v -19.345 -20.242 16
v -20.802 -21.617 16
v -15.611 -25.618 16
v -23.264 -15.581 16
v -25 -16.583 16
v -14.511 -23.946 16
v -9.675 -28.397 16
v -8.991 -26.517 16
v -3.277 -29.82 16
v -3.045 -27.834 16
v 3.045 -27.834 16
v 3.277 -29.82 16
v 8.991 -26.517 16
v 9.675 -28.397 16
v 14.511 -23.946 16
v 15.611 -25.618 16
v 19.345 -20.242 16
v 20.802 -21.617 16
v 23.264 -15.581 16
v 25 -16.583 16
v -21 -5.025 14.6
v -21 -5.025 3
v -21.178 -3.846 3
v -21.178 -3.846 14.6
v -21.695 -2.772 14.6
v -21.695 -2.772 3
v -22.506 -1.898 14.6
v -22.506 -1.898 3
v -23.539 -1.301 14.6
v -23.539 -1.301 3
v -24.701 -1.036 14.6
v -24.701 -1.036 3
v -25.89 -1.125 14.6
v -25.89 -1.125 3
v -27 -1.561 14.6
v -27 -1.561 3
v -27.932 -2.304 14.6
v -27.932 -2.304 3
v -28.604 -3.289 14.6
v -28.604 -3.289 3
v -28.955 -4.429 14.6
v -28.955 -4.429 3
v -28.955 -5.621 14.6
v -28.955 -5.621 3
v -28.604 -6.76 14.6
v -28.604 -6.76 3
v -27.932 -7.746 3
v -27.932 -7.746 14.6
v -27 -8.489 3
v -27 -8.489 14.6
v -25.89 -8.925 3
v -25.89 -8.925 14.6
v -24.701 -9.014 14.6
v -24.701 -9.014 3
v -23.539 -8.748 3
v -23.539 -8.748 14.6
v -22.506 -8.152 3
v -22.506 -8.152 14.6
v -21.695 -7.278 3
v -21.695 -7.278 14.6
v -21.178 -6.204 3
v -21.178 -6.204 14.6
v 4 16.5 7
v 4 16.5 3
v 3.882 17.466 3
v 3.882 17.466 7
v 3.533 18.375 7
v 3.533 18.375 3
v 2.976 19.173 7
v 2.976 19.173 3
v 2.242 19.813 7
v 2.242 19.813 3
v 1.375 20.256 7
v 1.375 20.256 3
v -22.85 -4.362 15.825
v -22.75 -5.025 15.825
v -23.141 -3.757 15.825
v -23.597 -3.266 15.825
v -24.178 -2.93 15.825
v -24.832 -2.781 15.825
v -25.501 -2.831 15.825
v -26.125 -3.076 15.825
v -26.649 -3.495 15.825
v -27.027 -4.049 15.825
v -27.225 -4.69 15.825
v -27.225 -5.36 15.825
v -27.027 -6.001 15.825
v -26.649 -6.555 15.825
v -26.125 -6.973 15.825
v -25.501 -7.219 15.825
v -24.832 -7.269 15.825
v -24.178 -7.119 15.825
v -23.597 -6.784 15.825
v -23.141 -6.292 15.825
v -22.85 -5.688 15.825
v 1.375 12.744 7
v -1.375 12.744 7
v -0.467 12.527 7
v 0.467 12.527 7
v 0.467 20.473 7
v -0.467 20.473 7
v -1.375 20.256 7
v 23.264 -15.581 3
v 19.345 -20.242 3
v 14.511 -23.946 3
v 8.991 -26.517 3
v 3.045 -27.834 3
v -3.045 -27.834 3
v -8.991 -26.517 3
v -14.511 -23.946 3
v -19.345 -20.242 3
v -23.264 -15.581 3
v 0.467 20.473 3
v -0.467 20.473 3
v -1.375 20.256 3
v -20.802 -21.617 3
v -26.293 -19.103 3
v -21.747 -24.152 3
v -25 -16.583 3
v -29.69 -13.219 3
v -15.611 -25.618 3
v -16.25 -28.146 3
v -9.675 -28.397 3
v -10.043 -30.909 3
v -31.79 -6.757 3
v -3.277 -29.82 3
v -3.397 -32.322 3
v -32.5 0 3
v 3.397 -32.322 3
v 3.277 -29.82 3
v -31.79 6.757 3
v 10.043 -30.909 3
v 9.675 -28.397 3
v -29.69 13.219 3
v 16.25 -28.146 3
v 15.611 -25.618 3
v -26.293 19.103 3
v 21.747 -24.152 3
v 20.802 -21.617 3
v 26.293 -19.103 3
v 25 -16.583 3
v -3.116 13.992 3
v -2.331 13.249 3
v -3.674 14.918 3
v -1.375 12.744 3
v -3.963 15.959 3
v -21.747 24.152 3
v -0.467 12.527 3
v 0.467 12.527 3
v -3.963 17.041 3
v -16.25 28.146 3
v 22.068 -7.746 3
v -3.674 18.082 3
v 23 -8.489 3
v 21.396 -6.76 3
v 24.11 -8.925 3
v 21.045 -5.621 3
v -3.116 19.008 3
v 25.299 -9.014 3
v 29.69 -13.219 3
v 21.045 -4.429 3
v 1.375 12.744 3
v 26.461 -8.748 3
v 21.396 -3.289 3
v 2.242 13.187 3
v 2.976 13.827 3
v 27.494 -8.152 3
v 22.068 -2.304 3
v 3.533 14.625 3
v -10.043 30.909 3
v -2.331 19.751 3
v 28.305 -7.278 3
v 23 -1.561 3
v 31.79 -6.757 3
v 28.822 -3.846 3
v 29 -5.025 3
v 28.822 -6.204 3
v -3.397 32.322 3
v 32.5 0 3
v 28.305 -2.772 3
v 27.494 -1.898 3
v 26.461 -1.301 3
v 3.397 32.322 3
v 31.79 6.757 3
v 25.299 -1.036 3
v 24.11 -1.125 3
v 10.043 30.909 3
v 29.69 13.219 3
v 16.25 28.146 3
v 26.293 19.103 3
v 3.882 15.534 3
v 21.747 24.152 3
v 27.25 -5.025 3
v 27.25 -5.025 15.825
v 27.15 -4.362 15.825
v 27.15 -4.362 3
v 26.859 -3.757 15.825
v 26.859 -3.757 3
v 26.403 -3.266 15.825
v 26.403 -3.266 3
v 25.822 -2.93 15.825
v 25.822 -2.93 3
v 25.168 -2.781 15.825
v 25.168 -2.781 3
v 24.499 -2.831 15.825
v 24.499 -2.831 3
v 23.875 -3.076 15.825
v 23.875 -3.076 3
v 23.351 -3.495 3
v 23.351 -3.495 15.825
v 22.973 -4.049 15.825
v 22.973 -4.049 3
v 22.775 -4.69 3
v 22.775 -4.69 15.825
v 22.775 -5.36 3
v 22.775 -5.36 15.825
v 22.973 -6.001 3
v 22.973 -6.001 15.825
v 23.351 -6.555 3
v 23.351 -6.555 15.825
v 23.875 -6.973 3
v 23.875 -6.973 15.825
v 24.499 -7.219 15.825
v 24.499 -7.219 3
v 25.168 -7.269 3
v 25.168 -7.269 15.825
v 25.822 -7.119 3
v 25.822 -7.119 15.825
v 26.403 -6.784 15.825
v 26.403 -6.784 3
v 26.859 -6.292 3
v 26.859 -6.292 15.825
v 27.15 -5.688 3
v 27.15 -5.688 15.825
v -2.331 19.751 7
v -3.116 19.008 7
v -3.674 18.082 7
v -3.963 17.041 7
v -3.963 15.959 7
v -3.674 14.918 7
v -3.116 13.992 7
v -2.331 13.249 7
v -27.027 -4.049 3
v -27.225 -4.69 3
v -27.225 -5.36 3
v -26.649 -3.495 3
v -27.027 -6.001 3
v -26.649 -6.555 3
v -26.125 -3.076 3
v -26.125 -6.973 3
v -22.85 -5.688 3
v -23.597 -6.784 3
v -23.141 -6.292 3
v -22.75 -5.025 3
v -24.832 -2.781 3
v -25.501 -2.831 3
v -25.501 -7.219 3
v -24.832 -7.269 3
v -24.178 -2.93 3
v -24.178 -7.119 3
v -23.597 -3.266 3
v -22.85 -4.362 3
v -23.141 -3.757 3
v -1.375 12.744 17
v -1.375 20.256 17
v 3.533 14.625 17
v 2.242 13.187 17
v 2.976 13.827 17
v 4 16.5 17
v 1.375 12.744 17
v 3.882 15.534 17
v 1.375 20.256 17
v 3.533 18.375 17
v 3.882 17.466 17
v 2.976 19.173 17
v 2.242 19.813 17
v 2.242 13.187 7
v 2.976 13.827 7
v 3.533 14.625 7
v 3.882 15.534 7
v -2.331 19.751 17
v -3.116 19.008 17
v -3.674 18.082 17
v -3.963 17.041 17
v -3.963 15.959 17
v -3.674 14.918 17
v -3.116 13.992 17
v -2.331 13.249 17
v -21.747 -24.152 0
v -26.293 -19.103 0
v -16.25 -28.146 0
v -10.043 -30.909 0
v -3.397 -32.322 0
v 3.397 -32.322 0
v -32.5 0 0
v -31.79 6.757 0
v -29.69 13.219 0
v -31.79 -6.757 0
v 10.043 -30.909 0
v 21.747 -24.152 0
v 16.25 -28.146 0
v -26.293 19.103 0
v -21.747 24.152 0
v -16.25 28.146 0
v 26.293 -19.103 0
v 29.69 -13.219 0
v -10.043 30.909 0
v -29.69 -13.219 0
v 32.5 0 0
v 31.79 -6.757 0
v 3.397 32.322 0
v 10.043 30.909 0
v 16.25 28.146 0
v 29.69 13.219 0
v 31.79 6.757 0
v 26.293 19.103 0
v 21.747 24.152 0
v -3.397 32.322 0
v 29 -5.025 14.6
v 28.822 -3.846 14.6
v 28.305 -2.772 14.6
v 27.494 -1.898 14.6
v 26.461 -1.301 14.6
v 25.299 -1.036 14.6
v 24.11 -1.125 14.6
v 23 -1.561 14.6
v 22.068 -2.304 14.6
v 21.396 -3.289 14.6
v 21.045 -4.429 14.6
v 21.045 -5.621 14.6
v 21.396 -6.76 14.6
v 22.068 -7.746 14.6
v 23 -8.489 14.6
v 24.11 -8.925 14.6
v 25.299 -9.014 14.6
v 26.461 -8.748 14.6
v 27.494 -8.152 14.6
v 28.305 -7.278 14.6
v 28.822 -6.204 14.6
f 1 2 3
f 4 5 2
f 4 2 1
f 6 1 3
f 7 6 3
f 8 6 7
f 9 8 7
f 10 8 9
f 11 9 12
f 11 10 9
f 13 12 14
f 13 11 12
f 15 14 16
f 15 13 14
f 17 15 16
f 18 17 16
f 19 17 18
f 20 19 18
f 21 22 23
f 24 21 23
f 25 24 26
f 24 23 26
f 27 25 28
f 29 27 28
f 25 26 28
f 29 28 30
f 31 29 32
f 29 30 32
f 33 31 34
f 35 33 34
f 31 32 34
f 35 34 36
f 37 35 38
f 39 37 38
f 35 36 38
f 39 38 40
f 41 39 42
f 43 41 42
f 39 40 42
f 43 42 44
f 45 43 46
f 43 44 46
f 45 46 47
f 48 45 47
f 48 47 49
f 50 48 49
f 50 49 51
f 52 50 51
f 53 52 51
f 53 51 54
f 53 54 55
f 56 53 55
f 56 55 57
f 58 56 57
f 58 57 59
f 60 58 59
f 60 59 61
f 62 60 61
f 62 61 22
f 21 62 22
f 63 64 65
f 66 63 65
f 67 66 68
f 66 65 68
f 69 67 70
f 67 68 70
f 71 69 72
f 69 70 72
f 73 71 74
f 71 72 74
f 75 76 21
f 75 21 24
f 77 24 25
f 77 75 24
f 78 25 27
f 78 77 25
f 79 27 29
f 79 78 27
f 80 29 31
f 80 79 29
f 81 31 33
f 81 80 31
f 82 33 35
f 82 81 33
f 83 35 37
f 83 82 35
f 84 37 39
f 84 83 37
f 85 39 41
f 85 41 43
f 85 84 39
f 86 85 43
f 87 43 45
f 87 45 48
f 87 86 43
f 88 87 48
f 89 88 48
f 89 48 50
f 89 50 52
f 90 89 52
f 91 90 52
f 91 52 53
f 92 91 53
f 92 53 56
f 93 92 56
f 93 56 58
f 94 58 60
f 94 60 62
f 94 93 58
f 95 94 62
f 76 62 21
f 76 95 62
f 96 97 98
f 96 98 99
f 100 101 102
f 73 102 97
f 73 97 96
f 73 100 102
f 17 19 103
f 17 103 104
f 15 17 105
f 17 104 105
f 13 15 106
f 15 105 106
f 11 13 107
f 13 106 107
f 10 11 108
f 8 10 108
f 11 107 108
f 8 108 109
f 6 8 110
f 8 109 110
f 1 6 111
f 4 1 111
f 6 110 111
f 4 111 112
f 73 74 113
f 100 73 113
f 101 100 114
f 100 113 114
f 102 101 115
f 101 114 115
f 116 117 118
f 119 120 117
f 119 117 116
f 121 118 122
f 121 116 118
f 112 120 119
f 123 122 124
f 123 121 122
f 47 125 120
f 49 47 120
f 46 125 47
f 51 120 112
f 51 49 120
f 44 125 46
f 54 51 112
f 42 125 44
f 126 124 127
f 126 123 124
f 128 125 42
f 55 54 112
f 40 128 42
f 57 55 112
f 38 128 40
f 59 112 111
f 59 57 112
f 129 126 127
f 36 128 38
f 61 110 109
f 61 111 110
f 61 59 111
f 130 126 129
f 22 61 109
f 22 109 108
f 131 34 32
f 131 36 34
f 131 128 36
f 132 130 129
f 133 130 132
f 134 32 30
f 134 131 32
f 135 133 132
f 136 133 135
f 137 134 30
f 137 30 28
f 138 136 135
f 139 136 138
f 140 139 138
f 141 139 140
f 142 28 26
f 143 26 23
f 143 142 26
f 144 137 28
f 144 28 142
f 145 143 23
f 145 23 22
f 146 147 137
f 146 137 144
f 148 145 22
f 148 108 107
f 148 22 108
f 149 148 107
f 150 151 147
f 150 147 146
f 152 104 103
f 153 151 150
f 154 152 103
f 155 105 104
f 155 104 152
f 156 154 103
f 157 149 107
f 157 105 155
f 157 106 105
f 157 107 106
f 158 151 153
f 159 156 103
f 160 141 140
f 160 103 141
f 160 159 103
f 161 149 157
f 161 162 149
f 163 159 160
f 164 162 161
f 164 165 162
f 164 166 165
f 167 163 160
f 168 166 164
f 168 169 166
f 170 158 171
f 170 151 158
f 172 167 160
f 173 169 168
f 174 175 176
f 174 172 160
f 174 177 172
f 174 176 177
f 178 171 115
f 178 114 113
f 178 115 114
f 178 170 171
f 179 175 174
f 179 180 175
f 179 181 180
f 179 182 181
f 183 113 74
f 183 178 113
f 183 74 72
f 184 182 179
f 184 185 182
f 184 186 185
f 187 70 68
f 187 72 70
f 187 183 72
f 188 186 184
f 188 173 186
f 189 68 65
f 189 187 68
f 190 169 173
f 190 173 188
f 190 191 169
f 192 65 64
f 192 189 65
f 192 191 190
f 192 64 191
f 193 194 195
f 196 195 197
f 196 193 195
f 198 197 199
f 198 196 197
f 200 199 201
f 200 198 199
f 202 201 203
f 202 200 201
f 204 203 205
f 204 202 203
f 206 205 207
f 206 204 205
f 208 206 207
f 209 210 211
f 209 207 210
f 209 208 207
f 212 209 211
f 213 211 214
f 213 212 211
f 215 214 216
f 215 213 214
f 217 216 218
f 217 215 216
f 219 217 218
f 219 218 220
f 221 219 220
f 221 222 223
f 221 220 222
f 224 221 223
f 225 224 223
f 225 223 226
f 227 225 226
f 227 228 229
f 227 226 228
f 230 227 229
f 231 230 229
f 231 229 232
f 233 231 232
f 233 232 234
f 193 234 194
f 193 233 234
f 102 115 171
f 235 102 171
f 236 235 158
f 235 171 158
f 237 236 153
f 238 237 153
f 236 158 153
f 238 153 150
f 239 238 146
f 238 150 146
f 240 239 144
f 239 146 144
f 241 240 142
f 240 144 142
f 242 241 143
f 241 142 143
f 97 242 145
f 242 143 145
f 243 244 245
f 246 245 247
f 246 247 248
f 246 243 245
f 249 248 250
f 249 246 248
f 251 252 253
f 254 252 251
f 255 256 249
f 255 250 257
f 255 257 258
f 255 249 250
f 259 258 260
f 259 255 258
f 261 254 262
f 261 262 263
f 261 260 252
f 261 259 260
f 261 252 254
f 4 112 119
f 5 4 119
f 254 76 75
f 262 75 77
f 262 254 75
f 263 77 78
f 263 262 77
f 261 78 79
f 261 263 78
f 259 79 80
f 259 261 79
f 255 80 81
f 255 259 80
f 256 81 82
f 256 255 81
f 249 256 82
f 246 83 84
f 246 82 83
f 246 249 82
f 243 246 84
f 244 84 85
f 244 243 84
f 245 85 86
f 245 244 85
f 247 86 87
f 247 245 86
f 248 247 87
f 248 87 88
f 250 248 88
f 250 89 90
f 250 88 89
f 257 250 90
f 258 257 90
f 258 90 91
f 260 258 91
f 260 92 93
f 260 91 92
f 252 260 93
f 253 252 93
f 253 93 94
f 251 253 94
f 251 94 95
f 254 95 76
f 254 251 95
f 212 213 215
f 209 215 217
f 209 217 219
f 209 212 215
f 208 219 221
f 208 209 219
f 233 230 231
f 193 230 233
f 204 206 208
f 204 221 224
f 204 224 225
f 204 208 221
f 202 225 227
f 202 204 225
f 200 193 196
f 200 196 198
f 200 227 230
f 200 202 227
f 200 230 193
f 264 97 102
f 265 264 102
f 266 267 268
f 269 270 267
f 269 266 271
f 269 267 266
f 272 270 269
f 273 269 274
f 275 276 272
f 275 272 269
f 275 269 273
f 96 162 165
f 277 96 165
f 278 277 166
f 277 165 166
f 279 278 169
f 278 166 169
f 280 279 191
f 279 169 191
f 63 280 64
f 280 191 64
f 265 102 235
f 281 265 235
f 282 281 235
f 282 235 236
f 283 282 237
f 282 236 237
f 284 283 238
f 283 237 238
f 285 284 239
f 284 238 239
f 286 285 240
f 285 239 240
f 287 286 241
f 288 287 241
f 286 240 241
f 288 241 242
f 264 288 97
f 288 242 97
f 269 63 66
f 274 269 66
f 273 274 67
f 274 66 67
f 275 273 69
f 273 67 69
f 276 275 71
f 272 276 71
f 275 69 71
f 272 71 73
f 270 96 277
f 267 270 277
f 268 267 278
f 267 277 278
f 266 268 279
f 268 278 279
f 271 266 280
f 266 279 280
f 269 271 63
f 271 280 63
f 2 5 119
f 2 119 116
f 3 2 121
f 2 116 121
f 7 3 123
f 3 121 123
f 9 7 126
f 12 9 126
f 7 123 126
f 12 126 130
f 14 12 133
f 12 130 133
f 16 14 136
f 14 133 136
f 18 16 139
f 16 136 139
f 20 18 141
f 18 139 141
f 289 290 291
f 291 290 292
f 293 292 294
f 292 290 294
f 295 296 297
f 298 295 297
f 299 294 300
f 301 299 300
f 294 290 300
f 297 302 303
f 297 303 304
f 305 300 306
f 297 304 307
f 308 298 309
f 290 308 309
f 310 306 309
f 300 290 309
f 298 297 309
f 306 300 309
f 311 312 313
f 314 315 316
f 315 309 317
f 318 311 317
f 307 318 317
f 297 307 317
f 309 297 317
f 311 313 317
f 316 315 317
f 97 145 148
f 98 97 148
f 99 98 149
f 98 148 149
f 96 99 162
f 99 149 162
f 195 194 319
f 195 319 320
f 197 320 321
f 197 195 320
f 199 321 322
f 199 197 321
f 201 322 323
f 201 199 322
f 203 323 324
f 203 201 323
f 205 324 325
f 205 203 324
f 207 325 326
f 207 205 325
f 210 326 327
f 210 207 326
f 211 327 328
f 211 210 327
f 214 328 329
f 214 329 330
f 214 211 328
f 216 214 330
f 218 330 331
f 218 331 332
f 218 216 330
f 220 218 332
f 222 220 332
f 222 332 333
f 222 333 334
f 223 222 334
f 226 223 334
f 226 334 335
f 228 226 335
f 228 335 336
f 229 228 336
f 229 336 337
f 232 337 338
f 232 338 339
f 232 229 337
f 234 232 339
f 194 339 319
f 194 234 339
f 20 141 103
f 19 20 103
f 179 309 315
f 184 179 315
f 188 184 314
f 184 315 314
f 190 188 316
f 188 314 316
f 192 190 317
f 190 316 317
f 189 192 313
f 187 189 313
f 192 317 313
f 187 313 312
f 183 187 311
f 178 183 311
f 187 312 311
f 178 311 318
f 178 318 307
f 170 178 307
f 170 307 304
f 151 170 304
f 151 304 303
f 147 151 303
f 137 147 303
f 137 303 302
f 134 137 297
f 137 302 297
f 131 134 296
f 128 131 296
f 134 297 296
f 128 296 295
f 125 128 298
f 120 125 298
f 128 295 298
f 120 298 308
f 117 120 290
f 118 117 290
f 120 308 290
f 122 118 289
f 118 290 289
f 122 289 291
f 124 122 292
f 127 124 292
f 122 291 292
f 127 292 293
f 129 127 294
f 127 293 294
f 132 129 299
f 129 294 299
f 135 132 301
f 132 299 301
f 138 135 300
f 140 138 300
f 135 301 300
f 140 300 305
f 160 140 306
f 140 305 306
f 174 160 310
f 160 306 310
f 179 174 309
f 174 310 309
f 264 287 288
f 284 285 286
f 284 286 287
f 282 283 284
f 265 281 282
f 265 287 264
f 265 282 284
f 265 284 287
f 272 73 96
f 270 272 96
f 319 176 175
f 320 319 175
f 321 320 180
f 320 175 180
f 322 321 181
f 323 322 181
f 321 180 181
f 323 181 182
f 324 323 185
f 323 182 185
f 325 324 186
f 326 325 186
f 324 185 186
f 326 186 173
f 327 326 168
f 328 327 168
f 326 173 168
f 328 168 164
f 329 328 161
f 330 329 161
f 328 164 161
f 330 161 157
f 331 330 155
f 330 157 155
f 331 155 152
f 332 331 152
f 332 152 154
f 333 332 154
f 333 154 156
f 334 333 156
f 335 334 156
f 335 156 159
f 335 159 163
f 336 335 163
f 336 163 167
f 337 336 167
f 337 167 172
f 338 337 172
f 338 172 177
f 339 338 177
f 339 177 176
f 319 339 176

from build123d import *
from build123d import SkipClean  # not in build123d's __all__

# Parameters (mm, degrees)
F0_R     = 32.5
F0_R_2   = 4
F0_R_3   = 2.25
F1_DEPTH = 3
F2_START = 3
F2_DEPTH = 13
F3_START = 3
F3_DEPTH = 13
F5_START = 3
F5_DEPTH = 4
F6_START = 7
F6_DEPTH = 10


# Not quite as in the source:
# - a fillet or chamfer that OpenCascade refuses, or shapes differently, is made with other operations: its cross-section is extruded or revolved along the edge and cut away or added


with BuildPart() as f1:
    # F0 (on Top) → F1 (new body)
    with BuildSketch(Plane.XY):
        Circle(F0_R)
        with Locations((-25, -5.0249378106)):
            Circle(F0_R_2, mode=Mode.SUBTRACT)
        with BuildLine():
            ThreePointArc((25, -16.5831239518), (0, -30), (-25, -16.5831239518))
            Line((-25, -16.5831239518), (-23.2643659014, -15.5810551377))
            Line((-23.2643659014, -15.5810551377), (23.2643659014, -15.5810551377))
            Line((23.2643659014, -15.5810551377), (25, -16.5831239518))
        make_face(mode=Mode.SUBTRACT)
        with Locations((25, -5.0249378106)):
            Circle(F0_R_2, mode=Mode.SUBTRACT)
        with BuildLine():
            ThreePointArc((1.375, 20.2562448003), (3.2787192622, 18.7912878475), (4, 16.5))
            ThreePointArc((4, 16.5), (3.2787192622, 14.2087121525), (1.375, 12.7437551997))
            ThreePointArc((1.375, 12.7437551997), (0, 12.5), (-1.375, 12.7437551997))
            ThreePointArc((-1.375, 12.7437551997), (-4, 16.5), (-1.375, 20.2562448003))
            ThreePointArc((-1.375, 20.2562448003), (0, 20.5), (1.375, 20.2562448003))
        make_face(mode=Mode.SUBTRACT)
        with BuildLine():
            Line((23.2643659014, -15.5810551377), (-23.2643659014, -15.5810551377))
            ThreePointArc((-23.2643659014, -15.5810551377), (0, -28), (23.2643659014, -15.5810551377))
        make_face()
        with BuildLine():
            Line((-23.2643659014, -15.5810551377), (-25, -16.5831239518))
            ThreePointArc((-25, -16.5831239518), (0, -30), (25, -16.5831239518))
            Line((25, -16.5831239518), (23.2643659014, -15.5810551377))
            ThreePointArc((23.2643659014, -15.5810551377), (0, -28), (-23.2643659014, -15.5810551377))
        make_face()
        with Locations((25, -5.0249378106)):
            Circle(F0_R_2)
        with Locations((25, -5.0249378106)):
            Circle(F0_R_3, mode=Mode.SUBTRACT)
        with Locations((-25, -5.0249378106)):
            Circle(F0_R_2)
        with Locations((-25, -5.0249378106)):
            Circle(F0_R_3, mode=Mode.SUBTRACT)
        with BuildLine():
            Line((1.375, 12.7437551997), (1.375, 20.2562448003))
            ThreePointArc((1.375, 20.2562448003), (0, 20.5), (-1.375, 20.2562448003))
            Line((-1.375, 20.2562448003), (-1.375, 12.7437551997))
            ThreePointArc((-1.375, 12.7437551997), (0, 12.5), (1.375, 12.7437551997))
        make_face()
        with Locations((25, -5.0249378106)):
            Circle(F0_R_3)
        with Locations((-25, -5.0249378106)):
            Circle(F0_R_3)
        with BuildLine():
            ThreePointArc((1.375, 12.7437551997), (3.2787192622, 14.2087121525), (4, 16.5))
            ThreePointArc((4, 16.5), (3.2787192622, 18.7912878475), (1.375, 20.2562448003))
            Line((1.375, 20.2562448003), (1.375, 12.7437551997))
        make_face()
        with BuildLine():
            Line((-1.375, 12.7437551997), (-1.375, 20.2562448003))
            ThreePointArc((-1.375, 20.2562448003), (-4, 16.5), (-1.375, 12.7437551997))
        make_face()
    extrude(amount=F1_DEPTH)

    # F0 (on Top) → F2 (join)
    with BuildSketch(Plane.XY.offset(F2_START)):
        with BuildLine():
            Line((-23.2643659014, -15.5810551377), (-25, -16.5831239518))
            ThreePointArc((-25, -16.5831239518), (0, -30), (25, -16.5831239518))
            Line((25, -16.5831239518), (23.2643659014, -15.5810551377))
            ThreePointArc((23.2643659014, -15.5810551377), (0, -28), (-23.2643659014, -15.5810551377))
        make_face()
    extrude(amount=F2_DEPTH)

    # F0 (on Top) → F3 (join)
    with BuildSketch(Plane.XY.offset(F3_START)):
        with Locations((-25, -5.0249378106)):
            Circle(F0_R_2)
        with Locations((-25, -5.0249378106)):
            Circle(F0_R_3, mode=Mode.SUBTRACT)
        with Locations((25, -5.0249378106)):
            Circle(F0_R_2)
        with Locations((25, -5.0249378106)):
            Circle(F0_R_3, mode=Mode.SUBTRACT)
    extrude(amount=F3_DEPTH)

    # F4: chamfer of 2 x 1.4004150764 on 2 edges, made by hand

    # F4_s1 → F4_t2 (revolve, cut)
    with BuildSketch(Plane.XZ.offset(5.0249378106)):
        Polygon((-21, 14.5995849236), (-23, 16), (-21, 16), align=None)
    revolve(axis=Axis((-25, -5.0249378106, 16), (0, 0, 1)), mode=Mode.SUBTRACT)

    # F4_s3 → F4_t4 (revolve, cut)
    with BuildSketch(Plane.XZ.offset(5.0249378106)):
        Polygon((29, 14.5995849236), (27, 16), (29, 16), align=None)
    revolve(axis=Axis((25, -5.0249378106, 16), (0, 0, 1)), mode=Mode.SUBTRACT)

    # F0 (on Top) → F5 (join)
    with BuildSketch(Plane.XY.offset(F5_START)):
        with BuildLine():
            ThreePointArc((1.375, 12.7437551997), (3.2787192622, 14.2087121525), (4, 16.5))
            ThreePointArc((4, 16.5), (3.2787192622, 18.7912878475), (1.375, 20.2562448003))
            Line((1.375, 20.2562448003), (1.375, 12.7437551997))
        make_face()
        with BuildLine():
            Line((-1.375, 12.7437551997), (-1.375, 20.2562448003))
            ThreePointArc((-1.375, 20.2562448003), (-4, 16.5), (-1.375, 12.7437551997))
        make_face()
        with BuildLine():
            Line((1.375, 12.7437551997), (1.375, 20.2562448003))
            ThreePointArc((1.375, 20.2562448003), (0, 20.5), (-1.375, 20.2562448003))
            Line((-1.375, 20.2562448003), (-1.375, 12.7437551997))
            ThreePointArc((-1.375, 12.7437551997), (0, 12.5), (1.375, 12.7437551997))
        make_face()
    extrude(amount=F5_DEPTH)

    # F0 (on Top) → F6 (join)
    with BuildSketch(Plane.XY.offset(F6_START)):
        with BuildLine():
            Line((-1.375, 12.7437551997), (-1.375, 20.2562448003))
            ThreePointArc((-1.375, 20.2562448003), (-4, 16.5), (-1.375, 12.7437551997))
        make_face()
        with BuildLine():
            ThreePointArc((1.375, 12.7437551997), (3.2787192622, 14.2087121525), (4, 16.5))
            ThreePointArc((4, 16.5), (3.2787192622, 18.7912878475), (1.375, 20.2562448003))
            Line((1.375, 20.2562448003), (1.375, 12.7437551997))
        make_face()
    with SkipClean():  # cleaning this boolean's faces spoils the solid; the shape is the same uncleaned
        extrude(amount=F6_DEPTH)


solid = f1.part
